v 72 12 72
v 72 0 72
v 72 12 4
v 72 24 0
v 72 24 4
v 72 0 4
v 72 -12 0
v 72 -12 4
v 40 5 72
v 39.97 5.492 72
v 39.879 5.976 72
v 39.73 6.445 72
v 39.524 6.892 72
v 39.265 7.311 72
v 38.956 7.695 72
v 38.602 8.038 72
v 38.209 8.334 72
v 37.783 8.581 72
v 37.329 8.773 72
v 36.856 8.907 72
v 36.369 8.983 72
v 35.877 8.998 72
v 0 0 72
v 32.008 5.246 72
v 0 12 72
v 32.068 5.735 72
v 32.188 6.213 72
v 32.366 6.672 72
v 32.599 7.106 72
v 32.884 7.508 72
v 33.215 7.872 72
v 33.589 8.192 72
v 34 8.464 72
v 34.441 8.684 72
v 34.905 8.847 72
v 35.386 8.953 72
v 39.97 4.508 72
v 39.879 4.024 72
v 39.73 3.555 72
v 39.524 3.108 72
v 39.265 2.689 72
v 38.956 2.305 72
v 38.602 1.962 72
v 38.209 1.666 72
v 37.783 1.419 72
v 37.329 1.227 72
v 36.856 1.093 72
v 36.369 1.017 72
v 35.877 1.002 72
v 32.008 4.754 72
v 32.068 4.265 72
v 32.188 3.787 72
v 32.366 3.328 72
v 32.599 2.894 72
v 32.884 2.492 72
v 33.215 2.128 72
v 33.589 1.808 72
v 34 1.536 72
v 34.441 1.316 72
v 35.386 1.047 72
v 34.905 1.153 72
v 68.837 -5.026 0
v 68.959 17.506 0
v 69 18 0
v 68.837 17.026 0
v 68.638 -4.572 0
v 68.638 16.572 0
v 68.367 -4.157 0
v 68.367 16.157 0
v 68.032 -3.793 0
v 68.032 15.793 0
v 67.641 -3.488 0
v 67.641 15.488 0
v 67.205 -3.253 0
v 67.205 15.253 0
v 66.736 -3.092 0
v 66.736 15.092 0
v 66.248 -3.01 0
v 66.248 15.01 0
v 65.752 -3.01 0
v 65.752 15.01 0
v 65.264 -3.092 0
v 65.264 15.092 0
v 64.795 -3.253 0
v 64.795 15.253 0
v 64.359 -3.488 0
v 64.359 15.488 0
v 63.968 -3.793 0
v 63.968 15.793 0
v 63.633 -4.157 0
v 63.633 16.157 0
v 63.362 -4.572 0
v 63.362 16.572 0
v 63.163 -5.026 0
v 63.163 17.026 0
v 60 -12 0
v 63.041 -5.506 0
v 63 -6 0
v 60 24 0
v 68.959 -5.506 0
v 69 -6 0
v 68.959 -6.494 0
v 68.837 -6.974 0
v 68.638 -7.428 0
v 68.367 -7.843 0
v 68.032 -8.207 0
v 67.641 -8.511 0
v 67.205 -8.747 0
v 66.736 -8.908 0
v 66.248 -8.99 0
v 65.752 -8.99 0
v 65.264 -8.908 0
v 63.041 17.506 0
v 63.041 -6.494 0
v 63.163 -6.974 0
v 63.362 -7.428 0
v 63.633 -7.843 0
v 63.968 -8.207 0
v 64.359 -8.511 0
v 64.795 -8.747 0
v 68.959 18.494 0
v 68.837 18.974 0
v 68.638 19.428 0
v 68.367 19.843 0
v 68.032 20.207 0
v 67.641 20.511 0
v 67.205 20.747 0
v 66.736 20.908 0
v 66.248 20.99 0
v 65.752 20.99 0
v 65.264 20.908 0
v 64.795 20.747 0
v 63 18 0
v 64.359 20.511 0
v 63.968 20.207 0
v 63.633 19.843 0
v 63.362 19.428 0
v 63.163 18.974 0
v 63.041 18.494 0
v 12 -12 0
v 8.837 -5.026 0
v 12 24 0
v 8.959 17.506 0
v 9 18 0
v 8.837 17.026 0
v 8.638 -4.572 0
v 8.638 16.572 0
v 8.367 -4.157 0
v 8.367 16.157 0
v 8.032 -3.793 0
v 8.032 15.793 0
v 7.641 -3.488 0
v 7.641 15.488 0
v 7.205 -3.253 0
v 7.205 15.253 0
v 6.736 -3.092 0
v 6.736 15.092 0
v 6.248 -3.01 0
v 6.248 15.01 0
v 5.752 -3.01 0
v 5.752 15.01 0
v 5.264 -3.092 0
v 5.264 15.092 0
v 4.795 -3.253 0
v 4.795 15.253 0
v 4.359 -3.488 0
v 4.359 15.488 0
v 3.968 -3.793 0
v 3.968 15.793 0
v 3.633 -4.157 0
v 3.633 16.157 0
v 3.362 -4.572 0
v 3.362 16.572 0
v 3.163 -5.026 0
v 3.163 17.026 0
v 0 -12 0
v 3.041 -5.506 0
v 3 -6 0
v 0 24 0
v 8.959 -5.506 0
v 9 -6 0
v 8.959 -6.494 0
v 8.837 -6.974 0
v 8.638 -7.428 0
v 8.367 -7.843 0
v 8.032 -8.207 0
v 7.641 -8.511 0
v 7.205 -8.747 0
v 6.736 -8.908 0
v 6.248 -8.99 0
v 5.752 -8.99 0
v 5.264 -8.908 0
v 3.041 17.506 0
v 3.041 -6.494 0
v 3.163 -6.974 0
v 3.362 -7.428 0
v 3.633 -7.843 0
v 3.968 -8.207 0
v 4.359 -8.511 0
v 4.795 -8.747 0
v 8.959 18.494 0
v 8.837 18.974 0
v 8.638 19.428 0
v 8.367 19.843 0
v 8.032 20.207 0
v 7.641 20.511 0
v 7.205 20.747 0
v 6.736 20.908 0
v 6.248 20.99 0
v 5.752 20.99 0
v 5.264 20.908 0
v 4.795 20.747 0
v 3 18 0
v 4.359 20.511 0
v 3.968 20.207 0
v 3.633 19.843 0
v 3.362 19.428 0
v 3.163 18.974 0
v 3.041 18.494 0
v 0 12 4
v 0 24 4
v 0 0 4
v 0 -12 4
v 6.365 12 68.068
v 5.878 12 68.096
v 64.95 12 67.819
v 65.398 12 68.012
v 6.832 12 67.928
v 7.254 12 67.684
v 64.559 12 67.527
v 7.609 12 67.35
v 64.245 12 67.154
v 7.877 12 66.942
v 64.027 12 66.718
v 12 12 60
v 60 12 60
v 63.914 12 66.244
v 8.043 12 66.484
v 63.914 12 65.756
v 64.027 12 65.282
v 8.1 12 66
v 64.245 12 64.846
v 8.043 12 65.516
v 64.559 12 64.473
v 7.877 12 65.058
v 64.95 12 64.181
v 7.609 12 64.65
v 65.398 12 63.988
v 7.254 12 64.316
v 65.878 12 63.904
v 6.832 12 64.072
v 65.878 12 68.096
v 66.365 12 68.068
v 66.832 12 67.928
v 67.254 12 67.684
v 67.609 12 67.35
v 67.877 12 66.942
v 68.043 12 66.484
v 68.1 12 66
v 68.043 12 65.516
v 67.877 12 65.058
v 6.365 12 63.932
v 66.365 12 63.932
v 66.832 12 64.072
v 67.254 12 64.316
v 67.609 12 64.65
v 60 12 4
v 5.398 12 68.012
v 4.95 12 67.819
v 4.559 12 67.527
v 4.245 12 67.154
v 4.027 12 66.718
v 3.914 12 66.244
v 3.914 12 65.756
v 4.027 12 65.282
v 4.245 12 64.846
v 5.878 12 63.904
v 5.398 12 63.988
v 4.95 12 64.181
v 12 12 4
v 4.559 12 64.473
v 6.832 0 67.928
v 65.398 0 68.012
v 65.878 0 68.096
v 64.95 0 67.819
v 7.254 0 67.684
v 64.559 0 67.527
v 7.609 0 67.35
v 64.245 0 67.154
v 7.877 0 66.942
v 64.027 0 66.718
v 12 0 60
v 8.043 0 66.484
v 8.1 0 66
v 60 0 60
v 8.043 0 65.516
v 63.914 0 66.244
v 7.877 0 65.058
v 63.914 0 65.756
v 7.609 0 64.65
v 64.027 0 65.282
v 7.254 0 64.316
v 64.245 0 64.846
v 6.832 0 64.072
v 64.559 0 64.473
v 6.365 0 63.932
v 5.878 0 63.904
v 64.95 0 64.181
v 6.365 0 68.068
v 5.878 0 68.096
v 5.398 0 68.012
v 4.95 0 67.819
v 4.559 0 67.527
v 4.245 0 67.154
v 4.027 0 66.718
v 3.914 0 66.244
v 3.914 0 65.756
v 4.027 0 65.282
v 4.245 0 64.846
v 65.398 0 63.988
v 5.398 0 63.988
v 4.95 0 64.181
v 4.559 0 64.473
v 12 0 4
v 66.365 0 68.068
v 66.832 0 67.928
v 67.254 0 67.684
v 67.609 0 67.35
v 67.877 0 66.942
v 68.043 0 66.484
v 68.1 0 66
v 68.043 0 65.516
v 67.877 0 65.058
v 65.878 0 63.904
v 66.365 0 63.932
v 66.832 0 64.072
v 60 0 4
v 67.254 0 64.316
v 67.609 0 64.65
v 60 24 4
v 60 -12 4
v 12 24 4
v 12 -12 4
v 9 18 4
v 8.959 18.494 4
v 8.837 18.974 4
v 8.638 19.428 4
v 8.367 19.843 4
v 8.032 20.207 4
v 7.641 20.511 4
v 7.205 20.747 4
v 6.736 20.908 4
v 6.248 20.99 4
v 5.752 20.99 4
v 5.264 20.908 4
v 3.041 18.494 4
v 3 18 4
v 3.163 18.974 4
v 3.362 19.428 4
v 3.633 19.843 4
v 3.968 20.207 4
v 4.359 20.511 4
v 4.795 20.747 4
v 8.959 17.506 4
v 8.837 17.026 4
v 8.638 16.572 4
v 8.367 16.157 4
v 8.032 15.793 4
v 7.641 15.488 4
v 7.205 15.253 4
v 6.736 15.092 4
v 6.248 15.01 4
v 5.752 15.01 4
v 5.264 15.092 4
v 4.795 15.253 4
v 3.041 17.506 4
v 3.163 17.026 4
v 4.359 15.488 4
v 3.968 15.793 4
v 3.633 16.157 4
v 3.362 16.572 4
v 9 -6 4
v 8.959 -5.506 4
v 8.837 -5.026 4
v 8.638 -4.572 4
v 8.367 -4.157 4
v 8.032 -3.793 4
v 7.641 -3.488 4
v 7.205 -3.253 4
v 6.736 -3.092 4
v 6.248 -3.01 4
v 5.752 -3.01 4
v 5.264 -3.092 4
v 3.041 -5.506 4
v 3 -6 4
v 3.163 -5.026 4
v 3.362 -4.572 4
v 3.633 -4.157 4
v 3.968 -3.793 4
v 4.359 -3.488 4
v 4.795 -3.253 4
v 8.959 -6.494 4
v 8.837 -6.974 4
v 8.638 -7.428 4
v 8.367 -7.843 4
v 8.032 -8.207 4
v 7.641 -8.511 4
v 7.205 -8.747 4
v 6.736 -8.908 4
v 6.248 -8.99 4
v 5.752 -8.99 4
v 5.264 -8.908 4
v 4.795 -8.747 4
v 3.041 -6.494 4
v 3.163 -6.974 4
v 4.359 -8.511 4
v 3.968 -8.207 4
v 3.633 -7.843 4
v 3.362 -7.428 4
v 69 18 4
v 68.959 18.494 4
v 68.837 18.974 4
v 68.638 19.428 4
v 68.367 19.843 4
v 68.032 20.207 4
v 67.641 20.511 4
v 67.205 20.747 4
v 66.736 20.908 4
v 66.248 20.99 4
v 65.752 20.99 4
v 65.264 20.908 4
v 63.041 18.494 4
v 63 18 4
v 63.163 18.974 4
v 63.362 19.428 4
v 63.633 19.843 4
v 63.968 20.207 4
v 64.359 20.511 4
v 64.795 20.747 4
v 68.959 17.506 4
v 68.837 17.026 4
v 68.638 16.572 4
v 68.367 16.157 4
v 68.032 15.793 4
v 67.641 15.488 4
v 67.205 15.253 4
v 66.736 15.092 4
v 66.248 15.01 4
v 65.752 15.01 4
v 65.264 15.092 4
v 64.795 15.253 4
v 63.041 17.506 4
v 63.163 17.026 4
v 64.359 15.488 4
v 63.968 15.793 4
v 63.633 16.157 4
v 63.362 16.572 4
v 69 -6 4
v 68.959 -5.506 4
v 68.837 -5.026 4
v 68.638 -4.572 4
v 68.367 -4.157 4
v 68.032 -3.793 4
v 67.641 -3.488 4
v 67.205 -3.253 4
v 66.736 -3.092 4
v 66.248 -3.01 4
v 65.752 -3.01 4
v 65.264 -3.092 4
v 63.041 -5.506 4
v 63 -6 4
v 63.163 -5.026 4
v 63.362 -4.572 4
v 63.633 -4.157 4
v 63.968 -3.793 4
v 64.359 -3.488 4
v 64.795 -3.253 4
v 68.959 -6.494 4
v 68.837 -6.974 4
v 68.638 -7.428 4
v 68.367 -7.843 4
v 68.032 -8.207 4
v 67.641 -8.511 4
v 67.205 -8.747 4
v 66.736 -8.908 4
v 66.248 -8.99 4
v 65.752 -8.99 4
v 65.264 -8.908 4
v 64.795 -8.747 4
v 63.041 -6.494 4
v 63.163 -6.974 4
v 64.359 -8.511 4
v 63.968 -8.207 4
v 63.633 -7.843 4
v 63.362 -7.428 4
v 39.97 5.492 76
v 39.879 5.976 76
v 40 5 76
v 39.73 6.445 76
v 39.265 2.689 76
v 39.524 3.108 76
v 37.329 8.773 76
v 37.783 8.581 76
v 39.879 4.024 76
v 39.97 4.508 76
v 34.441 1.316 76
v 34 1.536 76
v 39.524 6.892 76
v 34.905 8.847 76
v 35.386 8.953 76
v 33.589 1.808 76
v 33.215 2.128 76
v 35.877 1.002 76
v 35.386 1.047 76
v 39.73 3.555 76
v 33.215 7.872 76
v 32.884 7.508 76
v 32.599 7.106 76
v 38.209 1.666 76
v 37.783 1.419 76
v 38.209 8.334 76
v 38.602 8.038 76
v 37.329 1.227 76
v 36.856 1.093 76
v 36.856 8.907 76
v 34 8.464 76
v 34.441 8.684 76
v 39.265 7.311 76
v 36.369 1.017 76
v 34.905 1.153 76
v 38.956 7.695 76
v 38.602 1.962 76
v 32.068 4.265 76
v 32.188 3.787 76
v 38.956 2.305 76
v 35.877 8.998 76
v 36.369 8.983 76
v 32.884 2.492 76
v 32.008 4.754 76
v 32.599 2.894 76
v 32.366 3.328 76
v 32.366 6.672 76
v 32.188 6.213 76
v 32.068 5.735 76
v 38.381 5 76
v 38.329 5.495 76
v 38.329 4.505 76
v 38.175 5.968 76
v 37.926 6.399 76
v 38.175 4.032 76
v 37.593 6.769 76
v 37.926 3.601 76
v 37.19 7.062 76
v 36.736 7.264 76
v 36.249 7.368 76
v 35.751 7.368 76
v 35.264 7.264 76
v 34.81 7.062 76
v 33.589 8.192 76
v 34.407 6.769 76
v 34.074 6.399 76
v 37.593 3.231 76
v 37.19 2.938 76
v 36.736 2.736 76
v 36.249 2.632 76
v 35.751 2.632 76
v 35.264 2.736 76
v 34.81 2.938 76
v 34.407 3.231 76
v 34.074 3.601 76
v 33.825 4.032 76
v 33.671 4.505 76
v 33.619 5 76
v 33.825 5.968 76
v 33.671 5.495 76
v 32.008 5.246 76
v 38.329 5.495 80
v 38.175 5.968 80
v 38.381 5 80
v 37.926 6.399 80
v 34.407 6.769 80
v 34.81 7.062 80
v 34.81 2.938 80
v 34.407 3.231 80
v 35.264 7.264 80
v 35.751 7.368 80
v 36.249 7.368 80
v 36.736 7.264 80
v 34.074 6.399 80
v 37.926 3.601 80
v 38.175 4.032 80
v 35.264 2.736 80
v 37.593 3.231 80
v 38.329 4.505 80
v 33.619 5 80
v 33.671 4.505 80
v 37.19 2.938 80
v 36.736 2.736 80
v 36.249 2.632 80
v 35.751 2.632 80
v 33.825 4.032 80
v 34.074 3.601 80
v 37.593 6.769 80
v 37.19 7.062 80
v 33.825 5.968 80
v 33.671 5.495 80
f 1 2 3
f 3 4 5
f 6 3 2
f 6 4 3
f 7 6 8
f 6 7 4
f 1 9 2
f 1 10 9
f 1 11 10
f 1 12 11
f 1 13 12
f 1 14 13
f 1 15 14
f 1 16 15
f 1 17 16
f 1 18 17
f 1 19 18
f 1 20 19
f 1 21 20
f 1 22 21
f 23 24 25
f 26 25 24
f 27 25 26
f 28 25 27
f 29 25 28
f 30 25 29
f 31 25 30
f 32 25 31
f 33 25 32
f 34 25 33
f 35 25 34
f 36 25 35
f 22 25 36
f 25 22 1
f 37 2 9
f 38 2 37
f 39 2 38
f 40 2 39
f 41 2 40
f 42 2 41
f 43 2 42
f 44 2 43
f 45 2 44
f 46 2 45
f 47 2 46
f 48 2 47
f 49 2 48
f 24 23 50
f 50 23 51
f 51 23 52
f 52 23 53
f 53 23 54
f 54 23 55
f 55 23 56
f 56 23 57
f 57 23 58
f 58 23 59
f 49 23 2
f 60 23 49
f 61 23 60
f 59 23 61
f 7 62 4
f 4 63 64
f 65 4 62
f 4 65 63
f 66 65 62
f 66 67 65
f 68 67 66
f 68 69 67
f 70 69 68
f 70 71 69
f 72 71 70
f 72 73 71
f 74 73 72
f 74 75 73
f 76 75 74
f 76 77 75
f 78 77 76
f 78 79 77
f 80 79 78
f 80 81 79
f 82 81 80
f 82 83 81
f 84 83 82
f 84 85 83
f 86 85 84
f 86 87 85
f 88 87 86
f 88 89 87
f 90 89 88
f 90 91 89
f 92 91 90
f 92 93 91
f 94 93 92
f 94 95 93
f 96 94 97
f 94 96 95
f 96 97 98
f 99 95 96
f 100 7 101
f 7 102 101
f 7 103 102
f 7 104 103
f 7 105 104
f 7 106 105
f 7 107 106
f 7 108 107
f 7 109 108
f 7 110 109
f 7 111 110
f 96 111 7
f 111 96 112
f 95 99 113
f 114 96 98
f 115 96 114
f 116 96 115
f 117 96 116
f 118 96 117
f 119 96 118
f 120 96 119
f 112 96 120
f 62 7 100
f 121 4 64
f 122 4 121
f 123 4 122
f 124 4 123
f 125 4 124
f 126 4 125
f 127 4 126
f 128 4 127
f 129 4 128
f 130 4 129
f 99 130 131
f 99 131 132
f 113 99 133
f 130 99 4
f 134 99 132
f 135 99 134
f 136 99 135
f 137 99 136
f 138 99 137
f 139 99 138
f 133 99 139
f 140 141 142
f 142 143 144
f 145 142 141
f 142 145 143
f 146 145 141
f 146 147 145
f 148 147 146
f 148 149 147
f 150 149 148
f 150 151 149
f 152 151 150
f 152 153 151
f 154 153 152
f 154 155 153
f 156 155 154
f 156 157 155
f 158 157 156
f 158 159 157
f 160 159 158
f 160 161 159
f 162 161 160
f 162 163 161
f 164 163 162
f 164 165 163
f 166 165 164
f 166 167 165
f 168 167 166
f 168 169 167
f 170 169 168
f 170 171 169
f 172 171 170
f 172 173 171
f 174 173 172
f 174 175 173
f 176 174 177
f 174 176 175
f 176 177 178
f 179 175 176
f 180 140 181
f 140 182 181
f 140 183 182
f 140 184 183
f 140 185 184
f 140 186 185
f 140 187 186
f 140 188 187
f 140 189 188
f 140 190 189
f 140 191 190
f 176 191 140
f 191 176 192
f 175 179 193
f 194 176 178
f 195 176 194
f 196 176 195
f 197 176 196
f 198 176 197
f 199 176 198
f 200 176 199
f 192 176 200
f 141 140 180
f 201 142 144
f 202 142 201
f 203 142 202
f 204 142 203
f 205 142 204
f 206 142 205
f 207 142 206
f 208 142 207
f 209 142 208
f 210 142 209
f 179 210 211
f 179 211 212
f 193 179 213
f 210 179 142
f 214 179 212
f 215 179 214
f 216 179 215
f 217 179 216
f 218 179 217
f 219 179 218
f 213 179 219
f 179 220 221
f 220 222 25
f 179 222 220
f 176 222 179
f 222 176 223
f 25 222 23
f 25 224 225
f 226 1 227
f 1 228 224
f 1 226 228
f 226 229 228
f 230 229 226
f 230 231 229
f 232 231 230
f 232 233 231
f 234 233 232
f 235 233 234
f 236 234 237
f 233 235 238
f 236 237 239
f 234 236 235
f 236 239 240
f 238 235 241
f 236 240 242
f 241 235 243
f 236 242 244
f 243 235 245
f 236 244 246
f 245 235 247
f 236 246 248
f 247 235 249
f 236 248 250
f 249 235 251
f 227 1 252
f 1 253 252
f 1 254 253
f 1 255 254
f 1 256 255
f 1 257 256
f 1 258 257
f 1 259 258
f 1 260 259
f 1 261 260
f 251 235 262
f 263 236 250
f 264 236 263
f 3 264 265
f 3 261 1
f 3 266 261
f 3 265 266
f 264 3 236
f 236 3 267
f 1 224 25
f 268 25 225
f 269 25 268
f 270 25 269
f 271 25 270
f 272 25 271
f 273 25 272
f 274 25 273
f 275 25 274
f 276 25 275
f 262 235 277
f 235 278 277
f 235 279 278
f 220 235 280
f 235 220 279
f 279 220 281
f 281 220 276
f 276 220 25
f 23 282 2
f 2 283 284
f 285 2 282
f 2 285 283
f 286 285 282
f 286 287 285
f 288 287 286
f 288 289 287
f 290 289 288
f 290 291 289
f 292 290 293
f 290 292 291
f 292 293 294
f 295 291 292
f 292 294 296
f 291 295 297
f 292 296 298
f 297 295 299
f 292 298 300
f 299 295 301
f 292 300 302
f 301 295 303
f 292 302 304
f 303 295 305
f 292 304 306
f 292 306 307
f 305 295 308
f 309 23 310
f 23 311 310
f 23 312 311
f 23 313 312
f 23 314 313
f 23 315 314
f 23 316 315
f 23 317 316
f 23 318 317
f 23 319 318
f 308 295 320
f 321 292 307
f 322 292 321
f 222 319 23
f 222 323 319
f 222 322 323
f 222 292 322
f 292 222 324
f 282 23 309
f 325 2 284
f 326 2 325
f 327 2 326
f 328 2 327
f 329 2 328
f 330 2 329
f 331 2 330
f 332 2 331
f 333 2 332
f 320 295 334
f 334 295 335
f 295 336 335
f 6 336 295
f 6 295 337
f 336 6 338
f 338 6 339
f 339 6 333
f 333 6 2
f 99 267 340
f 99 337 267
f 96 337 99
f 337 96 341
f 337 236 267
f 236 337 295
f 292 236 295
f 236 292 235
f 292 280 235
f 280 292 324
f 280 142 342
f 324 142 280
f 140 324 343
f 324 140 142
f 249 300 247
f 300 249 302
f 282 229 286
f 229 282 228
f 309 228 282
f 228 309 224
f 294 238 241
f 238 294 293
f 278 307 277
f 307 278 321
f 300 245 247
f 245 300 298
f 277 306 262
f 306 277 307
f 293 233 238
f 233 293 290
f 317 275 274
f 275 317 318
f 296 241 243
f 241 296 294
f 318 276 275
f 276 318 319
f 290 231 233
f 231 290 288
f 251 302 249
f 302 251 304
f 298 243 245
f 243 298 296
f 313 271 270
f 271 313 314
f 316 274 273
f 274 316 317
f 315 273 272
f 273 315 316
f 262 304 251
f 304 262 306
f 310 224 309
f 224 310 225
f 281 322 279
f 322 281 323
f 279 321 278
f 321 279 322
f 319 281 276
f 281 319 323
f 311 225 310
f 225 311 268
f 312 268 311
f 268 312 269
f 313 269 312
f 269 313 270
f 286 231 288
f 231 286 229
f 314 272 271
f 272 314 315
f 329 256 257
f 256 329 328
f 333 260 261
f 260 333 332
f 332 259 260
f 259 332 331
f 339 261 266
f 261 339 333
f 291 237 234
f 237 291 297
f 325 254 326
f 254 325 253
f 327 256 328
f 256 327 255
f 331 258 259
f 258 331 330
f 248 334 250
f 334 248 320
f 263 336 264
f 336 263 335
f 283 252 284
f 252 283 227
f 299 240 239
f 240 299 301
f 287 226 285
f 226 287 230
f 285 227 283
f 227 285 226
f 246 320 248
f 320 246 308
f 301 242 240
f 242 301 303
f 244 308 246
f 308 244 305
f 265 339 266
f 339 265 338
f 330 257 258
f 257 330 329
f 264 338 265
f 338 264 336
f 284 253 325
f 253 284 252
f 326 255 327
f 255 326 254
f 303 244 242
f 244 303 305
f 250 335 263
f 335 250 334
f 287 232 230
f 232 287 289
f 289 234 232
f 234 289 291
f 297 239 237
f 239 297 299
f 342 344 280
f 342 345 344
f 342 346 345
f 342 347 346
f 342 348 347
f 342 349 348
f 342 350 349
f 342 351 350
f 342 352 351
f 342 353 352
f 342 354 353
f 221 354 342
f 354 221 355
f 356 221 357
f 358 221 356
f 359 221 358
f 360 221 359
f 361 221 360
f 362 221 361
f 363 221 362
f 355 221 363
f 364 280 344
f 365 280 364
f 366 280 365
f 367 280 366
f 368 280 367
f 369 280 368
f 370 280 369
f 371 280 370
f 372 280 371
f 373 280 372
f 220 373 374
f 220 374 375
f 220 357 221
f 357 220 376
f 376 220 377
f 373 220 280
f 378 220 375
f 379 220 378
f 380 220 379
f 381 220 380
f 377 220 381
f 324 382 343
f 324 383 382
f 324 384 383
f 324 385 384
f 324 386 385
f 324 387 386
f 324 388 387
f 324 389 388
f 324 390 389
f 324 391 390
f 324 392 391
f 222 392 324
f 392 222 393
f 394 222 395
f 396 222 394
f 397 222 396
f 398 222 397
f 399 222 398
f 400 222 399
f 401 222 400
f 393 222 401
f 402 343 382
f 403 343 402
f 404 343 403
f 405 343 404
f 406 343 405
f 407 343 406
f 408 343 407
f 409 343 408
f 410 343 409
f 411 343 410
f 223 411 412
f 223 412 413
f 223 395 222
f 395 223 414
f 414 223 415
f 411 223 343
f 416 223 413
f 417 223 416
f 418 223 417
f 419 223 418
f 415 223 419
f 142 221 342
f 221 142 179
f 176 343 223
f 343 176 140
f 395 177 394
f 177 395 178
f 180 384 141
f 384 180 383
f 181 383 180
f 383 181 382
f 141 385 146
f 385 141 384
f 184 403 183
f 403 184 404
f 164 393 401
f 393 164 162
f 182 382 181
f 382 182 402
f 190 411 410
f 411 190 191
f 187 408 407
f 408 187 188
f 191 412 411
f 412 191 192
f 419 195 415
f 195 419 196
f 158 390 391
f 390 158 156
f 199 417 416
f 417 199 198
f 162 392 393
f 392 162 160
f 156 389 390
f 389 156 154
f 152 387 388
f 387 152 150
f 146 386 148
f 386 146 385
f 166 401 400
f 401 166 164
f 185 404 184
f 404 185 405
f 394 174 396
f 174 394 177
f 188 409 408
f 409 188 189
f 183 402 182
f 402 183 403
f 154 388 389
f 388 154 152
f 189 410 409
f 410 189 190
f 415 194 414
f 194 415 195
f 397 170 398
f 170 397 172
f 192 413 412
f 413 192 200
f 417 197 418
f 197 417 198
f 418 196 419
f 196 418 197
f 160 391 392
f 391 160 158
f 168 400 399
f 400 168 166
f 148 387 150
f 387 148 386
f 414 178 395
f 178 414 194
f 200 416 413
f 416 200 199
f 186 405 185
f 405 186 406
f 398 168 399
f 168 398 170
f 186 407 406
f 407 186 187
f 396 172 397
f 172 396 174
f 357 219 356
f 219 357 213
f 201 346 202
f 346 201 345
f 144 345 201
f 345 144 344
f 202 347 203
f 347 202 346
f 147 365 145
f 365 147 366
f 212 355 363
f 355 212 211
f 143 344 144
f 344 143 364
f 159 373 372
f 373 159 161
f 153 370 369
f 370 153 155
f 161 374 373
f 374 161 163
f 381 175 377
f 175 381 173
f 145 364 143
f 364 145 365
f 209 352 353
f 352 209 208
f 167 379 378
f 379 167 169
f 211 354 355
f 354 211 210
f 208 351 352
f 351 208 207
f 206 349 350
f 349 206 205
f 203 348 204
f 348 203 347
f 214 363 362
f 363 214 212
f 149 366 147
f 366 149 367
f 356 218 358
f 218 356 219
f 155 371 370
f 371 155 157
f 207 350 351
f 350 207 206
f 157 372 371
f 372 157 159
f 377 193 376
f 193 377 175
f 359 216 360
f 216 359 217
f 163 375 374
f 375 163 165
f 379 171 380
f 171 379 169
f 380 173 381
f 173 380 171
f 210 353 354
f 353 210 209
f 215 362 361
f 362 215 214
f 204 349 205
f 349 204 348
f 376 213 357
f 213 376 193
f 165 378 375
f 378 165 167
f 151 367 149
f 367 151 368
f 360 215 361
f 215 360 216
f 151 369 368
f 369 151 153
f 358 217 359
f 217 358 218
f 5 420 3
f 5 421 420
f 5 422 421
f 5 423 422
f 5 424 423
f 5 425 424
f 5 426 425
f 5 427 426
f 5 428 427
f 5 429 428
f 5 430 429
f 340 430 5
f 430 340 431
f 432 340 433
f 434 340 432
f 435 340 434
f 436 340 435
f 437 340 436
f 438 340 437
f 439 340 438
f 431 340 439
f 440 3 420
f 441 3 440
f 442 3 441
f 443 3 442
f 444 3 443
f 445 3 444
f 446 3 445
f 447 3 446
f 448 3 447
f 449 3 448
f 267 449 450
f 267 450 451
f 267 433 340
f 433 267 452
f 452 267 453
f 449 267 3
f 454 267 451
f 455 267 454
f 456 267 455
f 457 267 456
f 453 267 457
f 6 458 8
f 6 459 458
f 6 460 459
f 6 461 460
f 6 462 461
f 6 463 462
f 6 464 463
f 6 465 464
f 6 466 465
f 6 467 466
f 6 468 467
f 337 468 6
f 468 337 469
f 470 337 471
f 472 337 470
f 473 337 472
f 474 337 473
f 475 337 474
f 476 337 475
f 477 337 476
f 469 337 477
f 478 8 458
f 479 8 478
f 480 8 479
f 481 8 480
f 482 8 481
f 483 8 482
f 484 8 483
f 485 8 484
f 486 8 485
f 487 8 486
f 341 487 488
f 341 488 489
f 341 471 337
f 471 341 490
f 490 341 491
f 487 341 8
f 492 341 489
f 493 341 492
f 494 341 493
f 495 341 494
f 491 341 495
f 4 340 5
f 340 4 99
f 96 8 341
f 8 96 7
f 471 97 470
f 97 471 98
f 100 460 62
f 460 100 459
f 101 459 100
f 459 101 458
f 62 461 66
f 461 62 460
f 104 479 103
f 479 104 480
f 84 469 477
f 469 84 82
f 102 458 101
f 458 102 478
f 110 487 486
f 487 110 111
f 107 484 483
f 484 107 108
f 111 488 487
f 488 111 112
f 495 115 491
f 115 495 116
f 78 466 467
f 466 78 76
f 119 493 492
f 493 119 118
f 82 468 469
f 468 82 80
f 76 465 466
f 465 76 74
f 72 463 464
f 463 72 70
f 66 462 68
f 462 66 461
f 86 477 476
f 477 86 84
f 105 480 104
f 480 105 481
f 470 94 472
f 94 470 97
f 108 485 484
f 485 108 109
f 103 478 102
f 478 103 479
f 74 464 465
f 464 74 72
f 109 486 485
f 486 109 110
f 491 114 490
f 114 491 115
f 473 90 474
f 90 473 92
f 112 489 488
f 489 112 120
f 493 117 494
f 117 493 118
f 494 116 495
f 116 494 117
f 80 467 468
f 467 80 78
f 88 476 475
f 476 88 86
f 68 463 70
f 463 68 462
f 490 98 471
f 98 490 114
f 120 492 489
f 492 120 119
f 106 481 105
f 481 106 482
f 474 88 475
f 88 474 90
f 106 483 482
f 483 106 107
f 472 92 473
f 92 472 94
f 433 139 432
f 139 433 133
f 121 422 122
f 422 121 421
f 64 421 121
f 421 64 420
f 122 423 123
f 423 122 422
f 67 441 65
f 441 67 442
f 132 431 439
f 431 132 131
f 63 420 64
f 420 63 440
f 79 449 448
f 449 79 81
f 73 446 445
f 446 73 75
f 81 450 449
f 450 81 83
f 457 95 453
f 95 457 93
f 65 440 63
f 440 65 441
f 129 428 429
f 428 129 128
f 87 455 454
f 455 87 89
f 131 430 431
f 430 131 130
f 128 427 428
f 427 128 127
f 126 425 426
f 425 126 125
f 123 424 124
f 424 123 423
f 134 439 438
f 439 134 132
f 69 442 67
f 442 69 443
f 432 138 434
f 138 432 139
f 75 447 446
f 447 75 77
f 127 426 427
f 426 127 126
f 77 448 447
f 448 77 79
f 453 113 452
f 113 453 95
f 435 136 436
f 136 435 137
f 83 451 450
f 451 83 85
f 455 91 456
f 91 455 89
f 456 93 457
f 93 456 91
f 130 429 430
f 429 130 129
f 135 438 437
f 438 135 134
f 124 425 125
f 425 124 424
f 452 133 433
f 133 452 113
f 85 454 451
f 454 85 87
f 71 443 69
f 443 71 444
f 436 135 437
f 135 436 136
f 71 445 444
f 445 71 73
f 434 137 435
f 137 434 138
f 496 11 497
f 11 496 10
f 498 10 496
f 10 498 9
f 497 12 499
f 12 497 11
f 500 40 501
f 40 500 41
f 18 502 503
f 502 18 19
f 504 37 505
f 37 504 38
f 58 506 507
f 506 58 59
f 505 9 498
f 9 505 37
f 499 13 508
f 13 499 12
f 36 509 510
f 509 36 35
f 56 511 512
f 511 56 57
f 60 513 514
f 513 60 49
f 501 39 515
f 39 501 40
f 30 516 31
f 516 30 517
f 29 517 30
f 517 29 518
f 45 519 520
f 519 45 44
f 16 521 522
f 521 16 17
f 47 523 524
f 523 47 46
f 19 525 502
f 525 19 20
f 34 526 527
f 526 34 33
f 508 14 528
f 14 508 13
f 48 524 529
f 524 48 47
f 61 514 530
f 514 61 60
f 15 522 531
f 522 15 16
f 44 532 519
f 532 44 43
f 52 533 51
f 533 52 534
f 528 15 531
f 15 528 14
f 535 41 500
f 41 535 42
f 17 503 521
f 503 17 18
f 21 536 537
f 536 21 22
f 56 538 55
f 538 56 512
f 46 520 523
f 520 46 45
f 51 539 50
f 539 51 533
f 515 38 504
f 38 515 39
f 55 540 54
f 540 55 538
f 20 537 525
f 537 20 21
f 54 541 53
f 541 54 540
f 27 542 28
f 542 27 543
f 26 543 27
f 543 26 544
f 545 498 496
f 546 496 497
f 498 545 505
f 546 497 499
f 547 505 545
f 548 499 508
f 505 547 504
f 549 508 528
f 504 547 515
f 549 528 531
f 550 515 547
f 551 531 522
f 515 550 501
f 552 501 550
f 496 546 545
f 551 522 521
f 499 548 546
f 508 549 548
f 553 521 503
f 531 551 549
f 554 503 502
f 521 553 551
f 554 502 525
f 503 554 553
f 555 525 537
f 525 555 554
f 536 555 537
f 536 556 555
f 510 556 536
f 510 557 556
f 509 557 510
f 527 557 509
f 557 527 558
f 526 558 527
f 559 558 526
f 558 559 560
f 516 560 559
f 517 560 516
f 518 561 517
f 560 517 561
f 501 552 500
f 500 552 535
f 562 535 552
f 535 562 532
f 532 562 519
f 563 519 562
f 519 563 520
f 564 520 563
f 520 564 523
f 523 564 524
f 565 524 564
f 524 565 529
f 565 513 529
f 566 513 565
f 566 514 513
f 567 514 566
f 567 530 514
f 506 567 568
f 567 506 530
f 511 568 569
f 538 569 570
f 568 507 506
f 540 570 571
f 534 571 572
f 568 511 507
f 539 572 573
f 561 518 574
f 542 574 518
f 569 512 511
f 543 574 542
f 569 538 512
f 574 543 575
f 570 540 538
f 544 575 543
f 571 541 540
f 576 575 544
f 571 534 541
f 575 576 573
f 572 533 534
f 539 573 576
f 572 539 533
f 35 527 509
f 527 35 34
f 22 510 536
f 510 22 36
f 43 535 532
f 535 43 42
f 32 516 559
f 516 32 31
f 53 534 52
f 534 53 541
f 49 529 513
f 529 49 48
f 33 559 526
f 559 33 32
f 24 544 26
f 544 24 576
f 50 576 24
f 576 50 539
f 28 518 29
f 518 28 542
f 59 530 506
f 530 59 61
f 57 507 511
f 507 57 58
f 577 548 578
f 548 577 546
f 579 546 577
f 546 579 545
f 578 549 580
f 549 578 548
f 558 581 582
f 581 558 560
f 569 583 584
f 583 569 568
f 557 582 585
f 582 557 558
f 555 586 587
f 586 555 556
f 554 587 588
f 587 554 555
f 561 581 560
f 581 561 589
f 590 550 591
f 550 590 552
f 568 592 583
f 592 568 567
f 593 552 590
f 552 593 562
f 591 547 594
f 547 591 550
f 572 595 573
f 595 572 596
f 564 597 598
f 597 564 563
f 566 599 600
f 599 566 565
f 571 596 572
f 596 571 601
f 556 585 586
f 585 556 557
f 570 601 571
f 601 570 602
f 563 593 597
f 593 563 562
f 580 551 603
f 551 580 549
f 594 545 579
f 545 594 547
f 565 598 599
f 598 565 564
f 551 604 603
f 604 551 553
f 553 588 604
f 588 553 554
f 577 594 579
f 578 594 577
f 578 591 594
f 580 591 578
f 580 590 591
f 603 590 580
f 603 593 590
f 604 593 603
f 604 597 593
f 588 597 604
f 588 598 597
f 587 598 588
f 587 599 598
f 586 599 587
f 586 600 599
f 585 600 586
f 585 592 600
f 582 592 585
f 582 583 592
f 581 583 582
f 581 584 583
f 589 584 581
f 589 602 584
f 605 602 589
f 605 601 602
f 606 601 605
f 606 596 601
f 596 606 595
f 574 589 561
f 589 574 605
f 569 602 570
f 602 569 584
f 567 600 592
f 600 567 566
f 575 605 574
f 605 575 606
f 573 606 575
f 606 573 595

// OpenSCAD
// file: motor_and_rod_mount.scad
module MotorMount(border_width=2, height=10, fit_factor=1.025) {
    // Motor Specifications
    motor_diameter=28;
    motor_height=20;
    hole_position=17.5;
    hole_radius=2;
    bracket_width=7;
    // Mount Definition
    translate([0,bracket_width/2,0])
    difference() {
        translate([-(hole_position+hole_radius+border_width),
            -hole_radius-border_width,0]) 
            cube([2*(hole_position+hole_radius+border_width),
                motor_diameter/2+bracket_width/2+border_width,height]);
        translate([0,0,-1]) cylinder(r=fit_factor*motor_diameter/2, h=motor_height);
        translate([hole_position, 0, -1]) cylinder(r=hole_radius, h=height+2);
        translate([-hole_position, 0, -1]) cylinder(r=hole_radius, h=height+2);
    }
}

module Structure(rod_separation=60, rod_radius=2,thickness=12, fit_factor=1.05) {
    motor_height=60;
    // foot pads module
    module FootPad(h=4) {
        difference() {
            translate([0,-thickness,0]) cube([thickness, 3*thickness, h]);
            translate([thickness/2, -thickness/2, -1]) 
                cylinder(r=thickness/4, h=h+2);
            translate([thickness/2, 3*thickness/2, -1]) 
                cylinder(r=thickness/4, h=h+2);
        }
    }
    
    // main structure
    difference() {
        cube([rod_separation+thickness, thickness, motor_height+thickness]);
        
        // under gap
        translate([thickness,-1,-1])
        cube([rod_separation-thickness,thickness+2, motor_height+1]);
        
        // rod holes
        translate([thickness/2, -1, motor_height+thickness/2]) 
        rotate([-90,0,0]) cylinder(r=fit_factor*rod_radius, h=thickness+2);
        translate([thickness/2+rod_separation, -1, motor_height+thickness/2]) 
        rotate([-90,0,0]) cylinder(r=fit_factor*rod_radius, h=thickness+2);
    }
    
    FootPad();
    translate([rod_separation, 0, 0]) FootPad();
}

module MotorAndRodMount() {
    Structure();
    translate([36, -19, 60]) MotorMount(height=12);
}

MotorAndRodMount($fs=.5, $fa=.5);
// main file
use <motor_and_rod_mount.scad>

module PullyAndRodMount(fit_factor=1.05) {
    Structure();
    translate([36, 5, 72]) cylinder(r=4, h=4);
    translate([36, 5, 76]) cylinder(r=2.5/fit_factor, h=4);
}

PullyAndRodMount($fs=.5, $fa=.5);
